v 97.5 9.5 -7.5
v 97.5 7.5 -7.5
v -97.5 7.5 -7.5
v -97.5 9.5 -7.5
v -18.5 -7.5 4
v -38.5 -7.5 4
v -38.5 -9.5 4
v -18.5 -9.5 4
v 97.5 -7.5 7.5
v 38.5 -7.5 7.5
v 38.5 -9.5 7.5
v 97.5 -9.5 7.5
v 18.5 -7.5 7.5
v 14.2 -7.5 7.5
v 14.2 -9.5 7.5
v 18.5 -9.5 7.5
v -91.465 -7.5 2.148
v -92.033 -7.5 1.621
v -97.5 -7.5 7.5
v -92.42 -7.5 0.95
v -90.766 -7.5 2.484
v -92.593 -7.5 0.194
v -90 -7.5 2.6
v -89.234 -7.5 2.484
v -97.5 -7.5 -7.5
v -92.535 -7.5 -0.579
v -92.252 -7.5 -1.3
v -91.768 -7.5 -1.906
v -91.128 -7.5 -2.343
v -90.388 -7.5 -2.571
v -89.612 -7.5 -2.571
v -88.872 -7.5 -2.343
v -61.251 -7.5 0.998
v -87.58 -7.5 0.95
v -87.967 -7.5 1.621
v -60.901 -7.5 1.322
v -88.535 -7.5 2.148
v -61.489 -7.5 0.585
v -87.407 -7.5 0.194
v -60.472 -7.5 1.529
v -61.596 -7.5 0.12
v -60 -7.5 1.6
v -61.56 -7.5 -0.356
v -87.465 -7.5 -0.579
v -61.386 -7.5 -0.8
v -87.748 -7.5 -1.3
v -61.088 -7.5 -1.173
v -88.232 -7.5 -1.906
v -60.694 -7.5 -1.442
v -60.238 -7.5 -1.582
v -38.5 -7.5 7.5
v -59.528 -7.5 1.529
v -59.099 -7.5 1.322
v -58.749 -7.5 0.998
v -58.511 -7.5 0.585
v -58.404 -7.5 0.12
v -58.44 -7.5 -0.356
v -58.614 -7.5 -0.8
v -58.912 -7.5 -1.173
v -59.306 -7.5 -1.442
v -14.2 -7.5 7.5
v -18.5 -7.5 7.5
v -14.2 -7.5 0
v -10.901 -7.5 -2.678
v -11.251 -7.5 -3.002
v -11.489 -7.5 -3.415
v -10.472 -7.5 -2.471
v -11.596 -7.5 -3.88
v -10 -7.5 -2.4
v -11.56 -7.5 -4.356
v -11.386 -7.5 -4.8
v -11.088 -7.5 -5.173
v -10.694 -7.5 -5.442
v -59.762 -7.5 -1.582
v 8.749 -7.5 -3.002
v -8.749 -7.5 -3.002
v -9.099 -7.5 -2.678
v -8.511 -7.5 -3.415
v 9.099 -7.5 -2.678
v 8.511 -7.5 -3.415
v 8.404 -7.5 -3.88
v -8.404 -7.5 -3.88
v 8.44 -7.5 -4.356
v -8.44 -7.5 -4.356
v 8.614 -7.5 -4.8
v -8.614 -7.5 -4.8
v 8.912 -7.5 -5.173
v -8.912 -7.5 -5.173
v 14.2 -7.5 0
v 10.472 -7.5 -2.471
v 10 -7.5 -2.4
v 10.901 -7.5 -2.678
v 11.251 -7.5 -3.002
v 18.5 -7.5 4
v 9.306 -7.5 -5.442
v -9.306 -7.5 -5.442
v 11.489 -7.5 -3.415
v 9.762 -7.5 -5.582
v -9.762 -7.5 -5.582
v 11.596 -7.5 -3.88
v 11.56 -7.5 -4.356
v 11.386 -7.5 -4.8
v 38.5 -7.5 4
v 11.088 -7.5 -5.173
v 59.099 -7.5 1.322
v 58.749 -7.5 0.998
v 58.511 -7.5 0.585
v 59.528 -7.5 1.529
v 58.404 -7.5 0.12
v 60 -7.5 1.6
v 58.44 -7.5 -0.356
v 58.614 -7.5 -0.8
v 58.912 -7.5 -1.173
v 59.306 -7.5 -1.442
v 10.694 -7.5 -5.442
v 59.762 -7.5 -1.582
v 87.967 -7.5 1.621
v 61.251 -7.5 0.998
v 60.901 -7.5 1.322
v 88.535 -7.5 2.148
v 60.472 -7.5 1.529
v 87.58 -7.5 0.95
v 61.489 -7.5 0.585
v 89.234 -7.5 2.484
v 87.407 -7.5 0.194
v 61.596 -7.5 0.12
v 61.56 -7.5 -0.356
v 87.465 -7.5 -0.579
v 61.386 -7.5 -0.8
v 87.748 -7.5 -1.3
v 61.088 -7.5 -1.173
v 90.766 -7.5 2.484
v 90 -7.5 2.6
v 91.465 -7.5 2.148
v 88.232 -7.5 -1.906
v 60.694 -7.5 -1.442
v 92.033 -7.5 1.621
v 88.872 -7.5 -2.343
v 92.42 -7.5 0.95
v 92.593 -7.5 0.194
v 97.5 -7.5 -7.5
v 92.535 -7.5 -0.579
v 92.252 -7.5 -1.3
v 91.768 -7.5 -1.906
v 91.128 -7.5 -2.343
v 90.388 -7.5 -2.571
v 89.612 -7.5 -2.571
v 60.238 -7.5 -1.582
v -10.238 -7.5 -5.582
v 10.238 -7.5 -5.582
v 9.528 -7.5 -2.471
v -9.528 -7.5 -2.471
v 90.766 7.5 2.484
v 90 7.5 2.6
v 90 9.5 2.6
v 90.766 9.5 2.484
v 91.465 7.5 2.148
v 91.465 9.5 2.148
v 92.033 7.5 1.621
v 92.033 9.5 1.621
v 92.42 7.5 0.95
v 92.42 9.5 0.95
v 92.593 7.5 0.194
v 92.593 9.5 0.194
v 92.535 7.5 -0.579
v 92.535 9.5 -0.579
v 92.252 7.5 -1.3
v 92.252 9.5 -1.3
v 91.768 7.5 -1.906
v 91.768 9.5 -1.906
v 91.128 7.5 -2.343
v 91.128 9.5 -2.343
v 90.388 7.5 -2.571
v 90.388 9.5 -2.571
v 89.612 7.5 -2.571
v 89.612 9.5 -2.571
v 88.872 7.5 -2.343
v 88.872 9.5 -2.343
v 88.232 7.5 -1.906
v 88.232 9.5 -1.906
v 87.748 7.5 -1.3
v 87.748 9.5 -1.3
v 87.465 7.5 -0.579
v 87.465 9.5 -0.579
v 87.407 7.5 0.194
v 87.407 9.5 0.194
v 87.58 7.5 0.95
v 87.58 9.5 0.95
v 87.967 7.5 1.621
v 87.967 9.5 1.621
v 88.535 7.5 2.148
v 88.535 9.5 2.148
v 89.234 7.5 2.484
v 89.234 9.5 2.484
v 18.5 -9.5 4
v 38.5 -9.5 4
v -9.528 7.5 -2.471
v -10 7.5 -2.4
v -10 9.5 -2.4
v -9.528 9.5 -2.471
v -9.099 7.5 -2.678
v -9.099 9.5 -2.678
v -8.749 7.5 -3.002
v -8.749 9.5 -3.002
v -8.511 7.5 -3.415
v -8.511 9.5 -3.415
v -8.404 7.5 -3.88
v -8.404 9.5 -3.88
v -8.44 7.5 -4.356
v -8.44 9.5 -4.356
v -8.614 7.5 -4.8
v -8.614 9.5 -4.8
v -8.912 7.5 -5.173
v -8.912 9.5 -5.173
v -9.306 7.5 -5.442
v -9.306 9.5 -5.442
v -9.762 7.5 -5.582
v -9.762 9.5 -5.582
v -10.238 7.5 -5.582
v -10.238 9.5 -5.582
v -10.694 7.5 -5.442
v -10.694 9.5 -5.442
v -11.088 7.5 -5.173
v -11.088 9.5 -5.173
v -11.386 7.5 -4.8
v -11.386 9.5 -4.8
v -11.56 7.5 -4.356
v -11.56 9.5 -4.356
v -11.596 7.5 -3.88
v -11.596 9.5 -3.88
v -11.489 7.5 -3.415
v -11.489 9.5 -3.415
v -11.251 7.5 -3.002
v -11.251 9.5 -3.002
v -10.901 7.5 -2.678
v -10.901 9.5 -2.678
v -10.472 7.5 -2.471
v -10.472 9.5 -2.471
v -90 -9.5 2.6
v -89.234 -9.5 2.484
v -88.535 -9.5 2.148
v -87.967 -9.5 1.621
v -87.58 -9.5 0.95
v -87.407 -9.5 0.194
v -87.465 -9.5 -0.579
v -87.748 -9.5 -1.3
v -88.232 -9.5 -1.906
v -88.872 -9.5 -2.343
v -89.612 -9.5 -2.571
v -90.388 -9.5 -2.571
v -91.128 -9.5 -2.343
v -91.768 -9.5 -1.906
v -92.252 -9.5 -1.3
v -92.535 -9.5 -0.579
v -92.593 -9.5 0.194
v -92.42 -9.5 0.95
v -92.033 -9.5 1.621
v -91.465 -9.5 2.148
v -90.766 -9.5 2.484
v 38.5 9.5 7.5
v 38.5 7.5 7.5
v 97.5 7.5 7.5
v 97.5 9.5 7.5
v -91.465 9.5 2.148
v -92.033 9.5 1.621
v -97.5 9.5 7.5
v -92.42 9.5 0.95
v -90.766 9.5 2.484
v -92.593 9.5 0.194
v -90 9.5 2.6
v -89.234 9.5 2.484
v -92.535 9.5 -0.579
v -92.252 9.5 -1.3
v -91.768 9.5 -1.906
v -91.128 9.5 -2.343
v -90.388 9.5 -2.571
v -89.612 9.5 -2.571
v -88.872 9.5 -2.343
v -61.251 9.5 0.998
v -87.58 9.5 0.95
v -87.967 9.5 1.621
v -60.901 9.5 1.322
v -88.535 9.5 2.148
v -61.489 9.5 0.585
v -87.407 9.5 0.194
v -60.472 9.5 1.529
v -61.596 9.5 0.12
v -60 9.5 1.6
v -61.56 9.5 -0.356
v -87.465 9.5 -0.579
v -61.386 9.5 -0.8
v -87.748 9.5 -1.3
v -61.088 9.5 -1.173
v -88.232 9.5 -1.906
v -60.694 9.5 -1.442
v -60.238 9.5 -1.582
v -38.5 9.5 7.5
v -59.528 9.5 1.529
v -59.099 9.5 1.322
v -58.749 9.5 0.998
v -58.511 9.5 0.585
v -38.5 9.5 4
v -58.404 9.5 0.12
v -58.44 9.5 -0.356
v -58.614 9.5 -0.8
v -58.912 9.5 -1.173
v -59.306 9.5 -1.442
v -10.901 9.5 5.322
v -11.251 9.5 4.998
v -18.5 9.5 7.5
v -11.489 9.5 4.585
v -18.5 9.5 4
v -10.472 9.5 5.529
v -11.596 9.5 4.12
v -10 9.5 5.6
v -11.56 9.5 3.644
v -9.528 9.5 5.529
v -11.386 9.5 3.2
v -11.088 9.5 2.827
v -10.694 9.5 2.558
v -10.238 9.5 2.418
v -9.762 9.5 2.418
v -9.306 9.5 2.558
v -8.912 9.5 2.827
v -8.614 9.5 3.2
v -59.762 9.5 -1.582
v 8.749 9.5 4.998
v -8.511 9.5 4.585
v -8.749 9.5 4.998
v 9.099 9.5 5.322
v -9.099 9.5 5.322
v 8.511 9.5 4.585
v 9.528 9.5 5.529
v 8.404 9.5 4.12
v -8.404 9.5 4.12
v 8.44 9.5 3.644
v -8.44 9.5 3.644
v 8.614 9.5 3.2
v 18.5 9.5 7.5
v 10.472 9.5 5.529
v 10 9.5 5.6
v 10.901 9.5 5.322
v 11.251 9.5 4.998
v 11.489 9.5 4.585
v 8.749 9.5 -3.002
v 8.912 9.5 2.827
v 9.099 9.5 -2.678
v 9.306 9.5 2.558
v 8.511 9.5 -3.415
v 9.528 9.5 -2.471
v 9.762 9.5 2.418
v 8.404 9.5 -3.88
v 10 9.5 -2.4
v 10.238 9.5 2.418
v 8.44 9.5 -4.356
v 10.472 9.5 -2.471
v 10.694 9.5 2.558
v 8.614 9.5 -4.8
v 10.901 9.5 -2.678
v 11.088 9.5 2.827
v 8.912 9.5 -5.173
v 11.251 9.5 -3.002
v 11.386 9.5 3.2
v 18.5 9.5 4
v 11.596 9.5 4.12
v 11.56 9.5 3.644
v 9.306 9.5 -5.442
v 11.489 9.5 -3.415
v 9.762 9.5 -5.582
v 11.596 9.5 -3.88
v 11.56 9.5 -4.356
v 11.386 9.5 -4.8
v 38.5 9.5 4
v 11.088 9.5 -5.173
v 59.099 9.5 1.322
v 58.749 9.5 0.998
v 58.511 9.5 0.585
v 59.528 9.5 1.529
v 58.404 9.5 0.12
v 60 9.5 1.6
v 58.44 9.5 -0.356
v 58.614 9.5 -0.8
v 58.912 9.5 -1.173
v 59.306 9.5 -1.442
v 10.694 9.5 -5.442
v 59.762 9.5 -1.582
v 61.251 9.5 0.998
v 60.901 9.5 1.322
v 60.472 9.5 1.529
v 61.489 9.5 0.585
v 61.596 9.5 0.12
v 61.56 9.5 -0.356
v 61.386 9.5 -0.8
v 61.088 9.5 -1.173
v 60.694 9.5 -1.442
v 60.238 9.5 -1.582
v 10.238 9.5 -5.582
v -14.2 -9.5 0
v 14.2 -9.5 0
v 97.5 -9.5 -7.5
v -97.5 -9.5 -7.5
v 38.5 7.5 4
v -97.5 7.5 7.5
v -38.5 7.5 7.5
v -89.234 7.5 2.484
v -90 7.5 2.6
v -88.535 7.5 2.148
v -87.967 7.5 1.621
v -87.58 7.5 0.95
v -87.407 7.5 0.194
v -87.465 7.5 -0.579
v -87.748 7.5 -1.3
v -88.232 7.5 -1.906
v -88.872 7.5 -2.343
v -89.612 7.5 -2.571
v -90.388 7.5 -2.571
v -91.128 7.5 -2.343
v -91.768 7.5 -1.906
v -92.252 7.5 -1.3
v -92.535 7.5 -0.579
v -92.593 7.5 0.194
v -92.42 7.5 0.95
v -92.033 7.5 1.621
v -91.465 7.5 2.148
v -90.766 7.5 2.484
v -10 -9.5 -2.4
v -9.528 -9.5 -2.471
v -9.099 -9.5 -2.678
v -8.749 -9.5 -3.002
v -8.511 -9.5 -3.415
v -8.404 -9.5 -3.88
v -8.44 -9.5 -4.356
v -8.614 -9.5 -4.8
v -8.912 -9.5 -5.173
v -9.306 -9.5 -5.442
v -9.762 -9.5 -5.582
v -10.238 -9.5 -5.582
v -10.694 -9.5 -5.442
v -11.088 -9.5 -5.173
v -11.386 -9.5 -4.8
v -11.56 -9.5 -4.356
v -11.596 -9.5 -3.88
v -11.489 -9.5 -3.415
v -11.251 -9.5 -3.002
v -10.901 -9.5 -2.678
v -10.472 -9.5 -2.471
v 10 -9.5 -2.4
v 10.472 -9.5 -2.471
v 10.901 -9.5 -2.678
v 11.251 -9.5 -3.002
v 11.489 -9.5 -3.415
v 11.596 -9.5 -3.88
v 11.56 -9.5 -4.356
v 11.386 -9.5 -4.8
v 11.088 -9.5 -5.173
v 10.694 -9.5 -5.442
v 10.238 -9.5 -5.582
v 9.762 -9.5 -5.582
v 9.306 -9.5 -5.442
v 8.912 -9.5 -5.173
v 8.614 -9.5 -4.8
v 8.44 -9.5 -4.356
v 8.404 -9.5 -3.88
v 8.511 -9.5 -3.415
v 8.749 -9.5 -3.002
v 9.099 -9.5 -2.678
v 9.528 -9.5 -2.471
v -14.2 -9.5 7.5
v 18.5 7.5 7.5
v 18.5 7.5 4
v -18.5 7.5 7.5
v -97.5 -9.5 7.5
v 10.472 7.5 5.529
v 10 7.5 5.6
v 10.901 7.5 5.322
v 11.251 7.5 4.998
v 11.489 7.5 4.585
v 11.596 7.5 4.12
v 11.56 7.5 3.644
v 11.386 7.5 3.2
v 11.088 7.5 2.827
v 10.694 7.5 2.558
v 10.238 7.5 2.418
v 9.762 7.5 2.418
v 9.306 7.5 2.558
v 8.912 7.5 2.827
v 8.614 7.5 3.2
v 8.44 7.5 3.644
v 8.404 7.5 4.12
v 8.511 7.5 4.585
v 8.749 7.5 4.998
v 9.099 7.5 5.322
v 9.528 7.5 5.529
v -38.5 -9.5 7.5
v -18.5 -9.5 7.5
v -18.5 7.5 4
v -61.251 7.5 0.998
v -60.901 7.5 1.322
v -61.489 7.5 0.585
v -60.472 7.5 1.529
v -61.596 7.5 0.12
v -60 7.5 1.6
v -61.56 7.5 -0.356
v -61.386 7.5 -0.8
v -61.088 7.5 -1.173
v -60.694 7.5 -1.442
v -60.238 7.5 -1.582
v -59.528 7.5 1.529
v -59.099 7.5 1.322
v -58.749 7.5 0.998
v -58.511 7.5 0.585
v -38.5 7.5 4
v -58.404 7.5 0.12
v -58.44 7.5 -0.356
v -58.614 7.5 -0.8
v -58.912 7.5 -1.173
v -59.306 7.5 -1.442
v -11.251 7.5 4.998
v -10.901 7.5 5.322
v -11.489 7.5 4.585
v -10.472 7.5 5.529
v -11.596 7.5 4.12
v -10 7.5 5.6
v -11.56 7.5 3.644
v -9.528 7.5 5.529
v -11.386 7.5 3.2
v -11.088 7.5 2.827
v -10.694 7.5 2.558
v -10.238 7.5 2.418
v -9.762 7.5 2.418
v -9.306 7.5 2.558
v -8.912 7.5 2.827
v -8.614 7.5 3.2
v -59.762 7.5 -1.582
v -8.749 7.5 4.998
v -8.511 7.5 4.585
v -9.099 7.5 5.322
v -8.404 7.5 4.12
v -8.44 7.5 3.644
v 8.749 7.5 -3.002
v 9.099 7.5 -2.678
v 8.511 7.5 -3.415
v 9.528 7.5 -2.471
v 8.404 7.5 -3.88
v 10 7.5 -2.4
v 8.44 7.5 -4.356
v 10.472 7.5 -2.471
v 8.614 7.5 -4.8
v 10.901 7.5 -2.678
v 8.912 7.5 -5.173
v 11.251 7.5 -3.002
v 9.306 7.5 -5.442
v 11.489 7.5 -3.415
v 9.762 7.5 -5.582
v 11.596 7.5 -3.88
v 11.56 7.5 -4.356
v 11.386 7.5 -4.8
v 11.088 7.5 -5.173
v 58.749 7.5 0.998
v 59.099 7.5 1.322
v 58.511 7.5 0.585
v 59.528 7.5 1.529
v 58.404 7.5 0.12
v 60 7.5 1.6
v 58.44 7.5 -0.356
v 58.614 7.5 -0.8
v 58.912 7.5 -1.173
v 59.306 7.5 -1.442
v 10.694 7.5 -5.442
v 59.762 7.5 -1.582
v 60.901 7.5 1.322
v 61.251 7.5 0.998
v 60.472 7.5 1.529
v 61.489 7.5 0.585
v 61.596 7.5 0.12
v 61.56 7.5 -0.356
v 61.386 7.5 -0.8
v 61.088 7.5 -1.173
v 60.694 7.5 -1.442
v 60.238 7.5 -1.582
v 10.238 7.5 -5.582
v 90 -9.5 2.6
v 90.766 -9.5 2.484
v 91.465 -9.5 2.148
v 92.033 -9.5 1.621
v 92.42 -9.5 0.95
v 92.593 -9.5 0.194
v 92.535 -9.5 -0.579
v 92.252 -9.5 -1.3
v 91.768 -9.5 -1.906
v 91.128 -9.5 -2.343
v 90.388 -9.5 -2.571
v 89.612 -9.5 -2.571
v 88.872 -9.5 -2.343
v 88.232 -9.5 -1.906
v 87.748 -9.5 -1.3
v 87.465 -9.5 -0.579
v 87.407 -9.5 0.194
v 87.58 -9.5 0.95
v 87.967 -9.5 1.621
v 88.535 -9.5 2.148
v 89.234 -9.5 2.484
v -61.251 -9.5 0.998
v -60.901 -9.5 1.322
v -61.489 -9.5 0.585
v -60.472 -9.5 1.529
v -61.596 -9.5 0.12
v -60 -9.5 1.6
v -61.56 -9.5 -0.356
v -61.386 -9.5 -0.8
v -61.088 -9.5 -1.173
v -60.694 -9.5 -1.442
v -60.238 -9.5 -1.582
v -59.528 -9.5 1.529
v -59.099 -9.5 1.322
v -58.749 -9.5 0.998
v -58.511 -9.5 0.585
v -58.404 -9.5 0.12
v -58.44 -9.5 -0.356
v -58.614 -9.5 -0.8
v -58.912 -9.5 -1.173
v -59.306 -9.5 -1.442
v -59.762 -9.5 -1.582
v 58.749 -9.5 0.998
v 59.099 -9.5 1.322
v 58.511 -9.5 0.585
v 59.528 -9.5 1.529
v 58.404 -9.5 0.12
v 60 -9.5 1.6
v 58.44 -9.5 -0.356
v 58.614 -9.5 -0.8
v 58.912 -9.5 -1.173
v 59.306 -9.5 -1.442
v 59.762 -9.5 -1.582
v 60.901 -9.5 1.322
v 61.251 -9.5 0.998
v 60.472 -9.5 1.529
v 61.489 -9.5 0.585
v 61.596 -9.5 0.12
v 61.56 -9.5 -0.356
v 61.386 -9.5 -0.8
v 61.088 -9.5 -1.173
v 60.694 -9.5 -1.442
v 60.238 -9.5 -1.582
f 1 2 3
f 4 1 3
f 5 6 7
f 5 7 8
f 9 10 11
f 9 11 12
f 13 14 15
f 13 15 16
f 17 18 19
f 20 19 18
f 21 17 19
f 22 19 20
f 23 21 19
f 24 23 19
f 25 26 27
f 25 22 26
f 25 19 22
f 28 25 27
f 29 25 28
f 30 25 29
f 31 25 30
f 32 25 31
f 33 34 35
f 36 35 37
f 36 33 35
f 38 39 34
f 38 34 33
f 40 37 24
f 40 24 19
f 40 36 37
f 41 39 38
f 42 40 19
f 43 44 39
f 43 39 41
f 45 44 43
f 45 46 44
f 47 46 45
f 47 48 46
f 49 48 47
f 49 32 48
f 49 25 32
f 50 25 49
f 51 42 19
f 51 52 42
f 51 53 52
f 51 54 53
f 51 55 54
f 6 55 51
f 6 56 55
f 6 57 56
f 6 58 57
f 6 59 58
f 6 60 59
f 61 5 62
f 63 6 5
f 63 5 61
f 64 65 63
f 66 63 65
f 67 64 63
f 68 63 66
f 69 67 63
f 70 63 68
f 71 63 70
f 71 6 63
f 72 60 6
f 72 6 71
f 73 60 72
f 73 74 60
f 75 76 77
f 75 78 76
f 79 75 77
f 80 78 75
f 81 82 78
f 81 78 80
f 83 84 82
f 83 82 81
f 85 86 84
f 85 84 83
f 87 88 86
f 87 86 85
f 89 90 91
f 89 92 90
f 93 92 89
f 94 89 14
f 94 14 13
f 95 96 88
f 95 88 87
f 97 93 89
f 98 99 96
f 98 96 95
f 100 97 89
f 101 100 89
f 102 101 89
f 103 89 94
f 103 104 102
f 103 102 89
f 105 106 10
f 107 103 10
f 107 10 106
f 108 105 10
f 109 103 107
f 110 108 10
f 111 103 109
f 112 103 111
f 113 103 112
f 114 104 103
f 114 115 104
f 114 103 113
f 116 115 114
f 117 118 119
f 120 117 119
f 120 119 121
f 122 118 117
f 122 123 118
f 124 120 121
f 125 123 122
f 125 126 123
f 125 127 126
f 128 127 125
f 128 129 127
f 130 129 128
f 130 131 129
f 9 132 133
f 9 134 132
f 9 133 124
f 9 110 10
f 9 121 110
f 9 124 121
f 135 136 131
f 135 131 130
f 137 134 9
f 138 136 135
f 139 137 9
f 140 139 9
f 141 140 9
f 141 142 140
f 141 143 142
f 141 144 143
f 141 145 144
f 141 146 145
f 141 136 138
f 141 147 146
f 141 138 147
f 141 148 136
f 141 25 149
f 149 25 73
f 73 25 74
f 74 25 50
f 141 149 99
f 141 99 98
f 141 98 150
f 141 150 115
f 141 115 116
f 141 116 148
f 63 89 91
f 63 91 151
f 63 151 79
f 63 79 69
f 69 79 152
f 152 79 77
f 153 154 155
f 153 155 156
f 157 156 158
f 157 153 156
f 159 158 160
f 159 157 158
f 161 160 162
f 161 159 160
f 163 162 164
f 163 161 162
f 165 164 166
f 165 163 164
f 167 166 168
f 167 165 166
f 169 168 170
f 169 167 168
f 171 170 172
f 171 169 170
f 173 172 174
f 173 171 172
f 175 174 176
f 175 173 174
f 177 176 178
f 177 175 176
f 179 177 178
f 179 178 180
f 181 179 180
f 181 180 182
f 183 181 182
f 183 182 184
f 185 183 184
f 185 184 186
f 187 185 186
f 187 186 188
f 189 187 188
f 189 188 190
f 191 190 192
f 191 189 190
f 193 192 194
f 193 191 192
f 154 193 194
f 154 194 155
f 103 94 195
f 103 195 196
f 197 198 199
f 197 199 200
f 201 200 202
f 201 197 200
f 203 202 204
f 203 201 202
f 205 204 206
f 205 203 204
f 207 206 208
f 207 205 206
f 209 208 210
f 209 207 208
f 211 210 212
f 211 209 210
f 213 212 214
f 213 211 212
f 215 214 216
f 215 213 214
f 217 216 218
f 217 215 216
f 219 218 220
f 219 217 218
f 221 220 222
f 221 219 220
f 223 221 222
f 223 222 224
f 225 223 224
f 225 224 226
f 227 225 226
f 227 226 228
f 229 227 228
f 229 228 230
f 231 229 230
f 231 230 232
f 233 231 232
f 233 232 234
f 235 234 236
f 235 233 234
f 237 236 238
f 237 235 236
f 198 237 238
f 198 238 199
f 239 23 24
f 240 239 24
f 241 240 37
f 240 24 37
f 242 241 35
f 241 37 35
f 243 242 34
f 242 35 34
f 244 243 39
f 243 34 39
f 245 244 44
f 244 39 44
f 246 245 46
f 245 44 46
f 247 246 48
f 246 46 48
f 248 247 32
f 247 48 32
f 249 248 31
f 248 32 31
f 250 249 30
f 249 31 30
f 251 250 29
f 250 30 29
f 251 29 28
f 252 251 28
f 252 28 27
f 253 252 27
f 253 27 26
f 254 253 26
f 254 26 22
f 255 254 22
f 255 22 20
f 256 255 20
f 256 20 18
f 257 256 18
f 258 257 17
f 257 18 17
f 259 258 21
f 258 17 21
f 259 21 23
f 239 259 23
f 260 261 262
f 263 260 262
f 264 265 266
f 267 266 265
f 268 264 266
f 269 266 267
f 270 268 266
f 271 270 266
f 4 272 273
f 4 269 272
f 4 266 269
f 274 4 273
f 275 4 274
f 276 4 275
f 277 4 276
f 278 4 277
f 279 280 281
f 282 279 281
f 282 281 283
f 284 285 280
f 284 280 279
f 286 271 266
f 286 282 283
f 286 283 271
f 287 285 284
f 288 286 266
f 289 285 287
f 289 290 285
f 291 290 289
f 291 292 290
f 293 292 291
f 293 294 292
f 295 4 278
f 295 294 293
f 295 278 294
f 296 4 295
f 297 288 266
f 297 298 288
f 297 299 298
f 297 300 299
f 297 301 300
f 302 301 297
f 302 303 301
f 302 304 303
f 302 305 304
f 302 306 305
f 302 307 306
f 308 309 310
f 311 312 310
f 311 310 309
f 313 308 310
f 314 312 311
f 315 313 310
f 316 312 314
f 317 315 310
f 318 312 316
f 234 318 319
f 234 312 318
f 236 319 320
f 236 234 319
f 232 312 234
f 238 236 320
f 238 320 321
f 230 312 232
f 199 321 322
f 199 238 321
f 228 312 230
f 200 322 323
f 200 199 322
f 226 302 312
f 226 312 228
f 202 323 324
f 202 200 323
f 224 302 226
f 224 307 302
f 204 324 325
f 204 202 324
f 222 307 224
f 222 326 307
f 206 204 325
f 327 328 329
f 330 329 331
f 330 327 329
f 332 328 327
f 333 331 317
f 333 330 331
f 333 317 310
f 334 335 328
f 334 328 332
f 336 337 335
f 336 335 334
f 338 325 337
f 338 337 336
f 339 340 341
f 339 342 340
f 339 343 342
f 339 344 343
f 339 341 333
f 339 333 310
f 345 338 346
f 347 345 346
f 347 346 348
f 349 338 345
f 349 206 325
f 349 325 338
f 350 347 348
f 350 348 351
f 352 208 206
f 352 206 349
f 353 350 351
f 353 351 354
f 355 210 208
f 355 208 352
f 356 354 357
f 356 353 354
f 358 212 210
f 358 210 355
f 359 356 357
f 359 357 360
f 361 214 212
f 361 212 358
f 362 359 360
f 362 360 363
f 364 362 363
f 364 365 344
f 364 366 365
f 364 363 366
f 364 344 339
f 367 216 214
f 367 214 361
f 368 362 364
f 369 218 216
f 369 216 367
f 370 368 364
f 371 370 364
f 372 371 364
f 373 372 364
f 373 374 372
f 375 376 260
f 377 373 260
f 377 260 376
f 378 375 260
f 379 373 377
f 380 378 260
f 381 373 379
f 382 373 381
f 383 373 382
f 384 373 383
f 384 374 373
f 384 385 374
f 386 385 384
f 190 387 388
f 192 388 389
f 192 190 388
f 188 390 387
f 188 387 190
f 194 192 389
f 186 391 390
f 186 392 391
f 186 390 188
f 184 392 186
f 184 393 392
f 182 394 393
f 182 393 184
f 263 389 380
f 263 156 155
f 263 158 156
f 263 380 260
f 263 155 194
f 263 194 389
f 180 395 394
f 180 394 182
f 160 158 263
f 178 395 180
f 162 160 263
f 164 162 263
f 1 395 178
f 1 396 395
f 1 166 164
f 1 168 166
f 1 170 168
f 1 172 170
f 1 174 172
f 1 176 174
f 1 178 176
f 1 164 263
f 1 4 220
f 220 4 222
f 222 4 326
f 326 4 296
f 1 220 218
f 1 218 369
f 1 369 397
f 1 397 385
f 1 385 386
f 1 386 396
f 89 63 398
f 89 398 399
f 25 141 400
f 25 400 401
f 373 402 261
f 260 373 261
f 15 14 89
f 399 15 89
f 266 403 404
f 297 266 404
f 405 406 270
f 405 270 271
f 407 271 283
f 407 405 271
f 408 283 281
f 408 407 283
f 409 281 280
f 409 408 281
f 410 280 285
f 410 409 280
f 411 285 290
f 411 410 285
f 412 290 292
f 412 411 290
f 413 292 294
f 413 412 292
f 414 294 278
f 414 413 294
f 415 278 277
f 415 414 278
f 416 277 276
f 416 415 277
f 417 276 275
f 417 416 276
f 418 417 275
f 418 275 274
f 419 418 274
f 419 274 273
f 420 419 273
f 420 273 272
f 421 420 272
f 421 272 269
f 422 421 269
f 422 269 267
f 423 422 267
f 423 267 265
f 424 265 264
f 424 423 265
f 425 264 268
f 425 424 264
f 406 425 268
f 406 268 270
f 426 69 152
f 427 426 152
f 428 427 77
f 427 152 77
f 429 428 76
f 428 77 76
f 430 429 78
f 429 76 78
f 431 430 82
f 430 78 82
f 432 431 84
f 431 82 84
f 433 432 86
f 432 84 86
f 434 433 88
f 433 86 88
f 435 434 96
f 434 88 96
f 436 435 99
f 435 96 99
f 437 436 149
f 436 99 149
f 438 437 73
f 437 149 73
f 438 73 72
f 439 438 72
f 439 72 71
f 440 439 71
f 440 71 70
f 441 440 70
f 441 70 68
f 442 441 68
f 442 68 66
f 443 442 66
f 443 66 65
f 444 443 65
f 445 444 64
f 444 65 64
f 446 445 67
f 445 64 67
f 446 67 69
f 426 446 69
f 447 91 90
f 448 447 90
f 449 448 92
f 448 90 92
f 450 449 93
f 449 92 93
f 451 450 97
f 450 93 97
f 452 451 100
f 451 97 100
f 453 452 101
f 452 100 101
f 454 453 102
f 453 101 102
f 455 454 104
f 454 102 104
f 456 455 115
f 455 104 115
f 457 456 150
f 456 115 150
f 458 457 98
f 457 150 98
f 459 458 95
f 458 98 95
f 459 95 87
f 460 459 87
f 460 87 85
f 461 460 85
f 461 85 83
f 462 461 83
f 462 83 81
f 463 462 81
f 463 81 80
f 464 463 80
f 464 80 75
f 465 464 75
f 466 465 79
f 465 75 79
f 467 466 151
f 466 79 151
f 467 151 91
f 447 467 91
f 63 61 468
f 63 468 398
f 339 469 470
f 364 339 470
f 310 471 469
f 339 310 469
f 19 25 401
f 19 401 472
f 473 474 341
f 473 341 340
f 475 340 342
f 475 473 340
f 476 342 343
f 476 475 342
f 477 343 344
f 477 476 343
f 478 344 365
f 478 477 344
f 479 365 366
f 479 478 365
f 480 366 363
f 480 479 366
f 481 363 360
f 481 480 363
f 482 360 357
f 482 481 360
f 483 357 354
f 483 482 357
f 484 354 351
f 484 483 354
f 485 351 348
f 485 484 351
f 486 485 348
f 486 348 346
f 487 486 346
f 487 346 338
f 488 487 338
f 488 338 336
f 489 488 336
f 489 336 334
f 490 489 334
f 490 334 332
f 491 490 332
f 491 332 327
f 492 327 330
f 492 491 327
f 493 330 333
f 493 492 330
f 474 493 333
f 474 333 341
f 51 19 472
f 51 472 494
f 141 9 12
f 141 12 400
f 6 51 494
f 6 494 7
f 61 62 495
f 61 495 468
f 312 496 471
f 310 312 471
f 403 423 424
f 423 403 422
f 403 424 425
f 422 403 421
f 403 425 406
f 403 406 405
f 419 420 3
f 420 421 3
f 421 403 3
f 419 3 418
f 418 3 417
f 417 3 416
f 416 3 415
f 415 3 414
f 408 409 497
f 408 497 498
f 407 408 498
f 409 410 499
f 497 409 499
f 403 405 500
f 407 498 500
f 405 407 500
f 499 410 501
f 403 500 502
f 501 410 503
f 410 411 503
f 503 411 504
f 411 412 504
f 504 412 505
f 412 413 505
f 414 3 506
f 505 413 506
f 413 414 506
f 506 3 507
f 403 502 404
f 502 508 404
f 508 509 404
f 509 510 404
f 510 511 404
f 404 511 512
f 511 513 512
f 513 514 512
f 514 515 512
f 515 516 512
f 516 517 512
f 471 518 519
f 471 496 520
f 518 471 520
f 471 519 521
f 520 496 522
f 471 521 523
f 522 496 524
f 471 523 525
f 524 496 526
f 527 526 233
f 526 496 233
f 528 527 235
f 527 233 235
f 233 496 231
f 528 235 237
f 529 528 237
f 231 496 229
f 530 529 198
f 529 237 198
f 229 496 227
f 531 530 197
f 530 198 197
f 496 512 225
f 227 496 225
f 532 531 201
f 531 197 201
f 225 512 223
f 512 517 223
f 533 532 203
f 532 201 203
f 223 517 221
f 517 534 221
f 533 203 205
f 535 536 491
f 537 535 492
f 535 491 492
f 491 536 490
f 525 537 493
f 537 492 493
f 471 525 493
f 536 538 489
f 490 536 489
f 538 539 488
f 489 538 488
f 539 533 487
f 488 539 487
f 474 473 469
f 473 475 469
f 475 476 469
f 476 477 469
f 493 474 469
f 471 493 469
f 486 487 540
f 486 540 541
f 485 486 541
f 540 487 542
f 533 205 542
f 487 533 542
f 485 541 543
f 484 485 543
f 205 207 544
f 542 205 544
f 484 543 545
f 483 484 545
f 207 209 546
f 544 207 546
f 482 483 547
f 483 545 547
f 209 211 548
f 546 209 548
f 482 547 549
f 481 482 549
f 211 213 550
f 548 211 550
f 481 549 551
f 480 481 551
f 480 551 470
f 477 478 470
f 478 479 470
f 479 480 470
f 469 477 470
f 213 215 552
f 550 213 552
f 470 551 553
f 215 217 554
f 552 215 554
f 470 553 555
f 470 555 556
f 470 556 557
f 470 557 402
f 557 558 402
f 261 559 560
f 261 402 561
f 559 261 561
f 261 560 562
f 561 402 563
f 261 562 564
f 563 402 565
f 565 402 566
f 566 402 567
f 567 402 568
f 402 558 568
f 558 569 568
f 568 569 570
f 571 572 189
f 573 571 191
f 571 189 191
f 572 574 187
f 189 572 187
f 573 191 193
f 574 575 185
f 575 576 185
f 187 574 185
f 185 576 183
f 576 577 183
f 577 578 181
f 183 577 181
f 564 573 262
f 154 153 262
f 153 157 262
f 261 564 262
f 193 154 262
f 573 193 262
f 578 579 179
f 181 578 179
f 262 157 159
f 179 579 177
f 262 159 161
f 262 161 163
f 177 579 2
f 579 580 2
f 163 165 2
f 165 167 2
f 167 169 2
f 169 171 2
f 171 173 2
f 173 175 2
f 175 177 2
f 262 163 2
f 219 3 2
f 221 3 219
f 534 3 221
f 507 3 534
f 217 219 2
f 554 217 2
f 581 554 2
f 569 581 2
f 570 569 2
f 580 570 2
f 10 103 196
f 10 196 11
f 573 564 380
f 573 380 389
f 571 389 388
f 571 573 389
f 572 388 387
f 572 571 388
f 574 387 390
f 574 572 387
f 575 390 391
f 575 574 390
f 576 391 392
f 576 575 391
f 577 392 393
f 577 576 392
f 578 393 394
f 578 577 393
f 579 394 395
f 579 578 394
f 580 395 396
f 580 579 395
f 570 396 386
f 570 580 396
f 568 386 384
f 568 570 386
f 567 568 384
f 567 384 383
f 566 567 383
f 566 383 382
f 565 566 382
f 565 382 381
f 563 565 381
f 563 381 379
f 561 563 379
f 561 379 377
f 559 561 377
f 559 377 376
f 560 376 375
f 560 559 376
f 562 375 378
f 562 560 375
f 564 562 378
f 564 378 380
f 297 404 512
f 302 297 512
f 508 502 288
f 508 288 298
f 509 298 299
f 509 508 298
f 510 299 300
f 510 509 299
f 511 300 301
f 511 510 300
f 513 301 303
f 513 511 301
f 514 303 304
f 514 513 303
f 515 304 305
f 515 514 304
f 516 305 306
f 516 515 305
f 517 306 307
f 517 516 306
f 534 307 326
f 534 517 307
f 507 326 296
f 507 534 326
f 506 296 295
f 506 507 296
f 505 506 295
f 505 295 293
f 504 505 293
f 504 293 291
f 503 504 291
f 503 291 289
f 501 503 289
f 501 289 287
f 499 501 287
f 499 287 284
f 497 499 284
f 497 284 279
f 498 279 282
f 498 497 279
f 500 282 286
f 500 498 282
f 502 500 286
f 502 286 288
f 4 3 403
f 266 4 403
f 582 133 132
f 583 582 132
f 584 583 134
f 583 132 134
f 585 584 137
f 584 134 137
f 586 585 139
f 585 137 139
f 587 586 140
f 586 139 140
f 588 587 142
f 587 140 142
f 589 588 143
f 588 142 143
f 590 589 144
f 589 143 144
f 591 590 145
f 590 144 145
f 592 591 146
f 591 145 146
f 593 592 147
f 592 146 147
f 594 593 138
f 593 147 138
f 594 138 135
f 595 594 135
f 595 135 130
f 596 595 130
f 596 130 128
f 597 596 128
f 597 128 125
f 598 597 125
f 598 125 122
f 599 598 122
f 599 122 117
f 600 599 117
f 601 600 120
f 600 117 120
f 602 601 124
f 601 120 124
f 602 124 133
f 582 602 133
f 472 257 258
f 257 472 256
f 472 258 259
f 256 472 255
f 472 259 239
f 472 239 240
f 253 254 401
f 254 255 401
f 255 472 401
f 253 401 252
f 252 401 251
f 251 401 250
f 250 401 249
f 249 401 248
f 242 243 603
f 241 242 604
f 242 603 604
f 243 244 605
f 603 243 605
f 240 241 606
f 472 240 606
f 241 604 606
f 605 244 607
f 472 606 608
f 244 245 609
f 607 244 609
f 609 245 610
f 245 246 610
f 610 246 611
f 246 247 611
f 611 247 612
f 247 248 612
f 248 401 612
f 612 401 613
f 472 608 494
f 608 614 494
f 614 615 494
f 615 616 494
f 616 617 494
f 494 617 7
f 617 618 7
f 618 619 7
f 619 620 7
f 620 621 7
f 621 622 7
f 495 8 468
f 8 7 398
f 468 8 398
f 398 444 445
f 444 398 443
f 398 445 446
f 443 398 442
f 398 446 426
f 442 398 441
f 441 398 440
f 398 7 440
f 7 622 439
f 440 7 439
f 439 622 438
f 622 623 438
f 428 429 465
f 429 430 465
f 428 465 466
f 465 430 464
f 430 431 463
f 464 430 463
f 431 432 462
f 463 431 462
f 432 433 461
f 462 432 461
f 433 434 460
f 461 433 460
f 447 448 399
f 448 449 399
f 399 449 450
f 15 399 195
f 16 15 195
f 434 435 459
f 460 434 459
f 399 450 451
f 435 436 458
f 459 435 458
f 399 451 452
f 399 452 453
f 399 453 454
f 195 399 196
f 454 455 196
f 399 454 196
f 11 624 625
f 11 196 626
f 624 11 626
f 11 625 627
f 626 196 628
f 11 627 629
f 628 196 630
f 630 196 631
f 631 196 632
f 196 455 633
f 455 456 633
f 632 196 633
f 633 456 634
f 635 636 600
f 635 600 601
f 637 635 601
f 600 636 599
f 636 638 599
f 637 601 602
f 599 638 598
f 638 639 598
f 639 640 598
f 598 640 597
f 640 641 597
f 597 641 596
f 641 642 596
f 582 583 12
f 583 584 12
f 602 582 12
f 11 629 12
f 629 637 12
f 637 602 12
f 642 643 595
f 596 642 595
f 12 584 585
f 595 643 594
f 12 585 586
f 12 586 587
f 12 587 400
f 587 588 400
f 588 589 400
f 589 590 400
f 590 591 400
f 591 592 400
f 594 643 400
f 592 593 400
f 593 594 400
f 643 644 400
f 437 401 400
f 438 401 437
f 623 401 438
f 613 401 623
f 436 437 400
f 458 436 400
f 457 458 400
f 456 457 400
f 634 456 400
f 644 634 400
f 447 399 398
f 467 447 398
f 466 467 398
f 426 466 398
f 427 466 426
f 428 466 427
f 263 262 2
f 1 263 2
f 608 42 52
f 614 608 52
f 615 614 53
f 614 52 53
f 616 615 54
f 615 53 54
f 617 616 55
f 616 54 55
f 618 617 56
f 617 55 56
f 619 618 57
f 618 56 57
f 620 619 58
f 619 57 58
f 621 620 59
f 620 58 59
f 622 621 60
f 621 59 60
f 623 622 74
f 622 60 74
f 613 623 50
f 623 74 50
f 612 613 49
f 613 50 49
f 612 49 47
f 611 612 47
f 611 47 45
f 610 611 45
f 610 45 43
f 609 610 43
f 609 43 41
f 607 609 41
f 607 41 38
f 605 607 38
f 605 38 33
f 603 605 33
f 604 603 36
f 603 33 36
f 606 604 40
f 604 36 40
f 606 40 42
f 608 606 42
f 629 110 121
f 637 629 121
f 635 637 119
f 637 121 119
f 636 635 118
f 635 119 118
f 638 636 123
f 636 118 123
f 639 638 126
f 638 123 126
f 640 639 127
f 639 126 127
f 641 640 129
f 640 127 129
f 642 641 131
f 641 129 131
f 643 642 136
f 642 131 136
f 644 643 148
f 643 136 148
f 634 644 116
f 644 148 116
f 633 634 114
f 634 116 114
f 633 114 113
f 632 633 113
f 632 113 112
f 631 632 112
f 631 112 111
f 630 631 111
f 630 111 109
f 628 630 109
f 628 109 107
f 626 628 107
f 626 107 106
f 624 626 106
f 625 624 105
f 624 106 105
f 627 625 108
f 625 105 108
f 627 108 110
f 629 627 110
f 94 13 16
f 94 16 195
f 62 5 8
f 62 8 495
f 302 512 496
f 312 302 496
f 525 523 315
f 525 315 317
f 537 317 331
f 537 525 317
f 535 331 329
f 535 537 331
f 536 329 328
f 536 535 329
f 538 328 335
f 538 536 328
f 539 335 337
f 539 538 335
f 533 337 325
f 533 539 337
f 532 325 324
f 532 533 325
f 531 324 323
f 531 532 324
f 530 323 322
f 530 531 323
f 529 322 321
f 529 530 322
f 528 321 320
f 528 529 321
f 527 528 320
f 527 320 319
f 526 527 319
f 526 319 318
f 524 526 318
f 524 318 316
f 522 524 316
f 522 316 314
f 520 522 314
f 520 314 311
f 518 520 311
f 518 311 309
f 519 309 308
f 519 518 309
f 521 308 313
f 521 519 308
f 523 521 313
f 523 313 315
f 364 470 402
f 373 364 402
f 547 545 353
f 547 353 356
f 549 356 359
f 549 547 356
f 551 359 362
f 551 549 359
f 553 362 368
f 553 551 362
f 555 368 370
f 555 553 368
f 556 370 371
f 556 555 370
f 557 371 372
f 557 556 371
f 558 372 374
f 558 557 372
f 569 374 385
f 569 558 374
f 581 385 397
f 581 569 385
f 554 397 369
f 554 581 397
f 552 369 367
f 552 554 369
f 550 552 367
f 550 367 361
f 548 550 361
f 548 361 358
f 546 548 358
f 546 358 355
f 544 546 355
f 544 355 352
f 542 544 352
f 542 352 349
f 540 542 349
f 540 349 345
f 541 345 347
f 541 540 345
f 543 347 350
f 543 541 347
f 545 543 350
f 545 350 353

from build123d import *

# Parameters (mm, degrees)
SKETCH_1_R          = 1.6
SKETCH_1_R_2        = 2.6
EXTRUDE_1_DEPTH     = 2
SKETCH_2_W          = 28.4
SKETCH_2_H          = 7.5
CUT_EXTRUDE_1_DEPTH = 100.25472281


with BuildPart() as part:
    # 草图1 → 凸台-拉伸1 (new body)
    with BuildSketch(Plane(origin=(0, 7.5, 0), x_dir=(1, 0, 0), z_dir=(0, 1, 0))):
        Polygon((97.5, 7.5), (-97.5, 7.5), (-97.5, -7.5), (-38.5, -7.5), (-38.5, -4), (-18.5, -4), (-18.5, -7.5), (18.5, -7.5), (18.5, -4), (38.5, -4), (38.5, -7.5), (97.5, -7.5), align=None)
        with Locations(Location((-10, -4, 0), (0, 0, 270))):
            Circle(SKETCH_1_R, mode=Mode.SUBTRACT)
        with Locations(Location((-90, 0, 0), (0, 0, 270))):
            Circle(SKETCH_1_R_2, mode=Mode.SUBTRACT)
        with Locations(Location((-60, 0, 0), (0, 0, 270))):
            Circle(SKETCH_1_R, mode=Mode.SUBTRACT)
        with Locations(Location((10, -4, 0), (0, 0, 270))):
            Circle(SKETCH_1_R, mode=Mode.SUBTRACT)
        with Locations(Location((-10, 4, 0), (0, 0, 270))):
            Circle(SKETCH_1_R, mode=Mode.SUBTRACT)
        with Locations(Location((60, 0, 0), (0, 0, 270))):
            Circle(SKETCH_1_R, mode=Mode.SUBTRACT)
        with Locations(Location((90, 0, 0), (0, 0, 270))):
            Circle(SKETCH_1_R_2, mode=Mode.SUBTRACT)
        with Locations(Location((10, 4, 0), (0, 0, 270))):
            Circle(SKETCH_1_R, mode=Mode.SUBTRACT)
    extrude(amount=EXTRUDE_1_DEPTH)


with BuildPart() as body_2:
    # 镜向3: mirrored copy
    add(part.part.mirror(Plane.ZX))

    # 草图2 → 切除-拉伸1 (cut, through all)
    with BuildSketch(Plane(origin=(0, -7.5, 0), x_dir=(1, 0, 0), z_dir=(0, 1, 0))):
        with Locations((0, -3.75)):
            Rectangle(SKETCH_2_W, SKETCH_2_H)
    extrude(amount=-CUT_EXTRUDE_1_DEPTH, mode=Mode.SUBTRACT)


solid = Compound([part.part, body_2.part])
